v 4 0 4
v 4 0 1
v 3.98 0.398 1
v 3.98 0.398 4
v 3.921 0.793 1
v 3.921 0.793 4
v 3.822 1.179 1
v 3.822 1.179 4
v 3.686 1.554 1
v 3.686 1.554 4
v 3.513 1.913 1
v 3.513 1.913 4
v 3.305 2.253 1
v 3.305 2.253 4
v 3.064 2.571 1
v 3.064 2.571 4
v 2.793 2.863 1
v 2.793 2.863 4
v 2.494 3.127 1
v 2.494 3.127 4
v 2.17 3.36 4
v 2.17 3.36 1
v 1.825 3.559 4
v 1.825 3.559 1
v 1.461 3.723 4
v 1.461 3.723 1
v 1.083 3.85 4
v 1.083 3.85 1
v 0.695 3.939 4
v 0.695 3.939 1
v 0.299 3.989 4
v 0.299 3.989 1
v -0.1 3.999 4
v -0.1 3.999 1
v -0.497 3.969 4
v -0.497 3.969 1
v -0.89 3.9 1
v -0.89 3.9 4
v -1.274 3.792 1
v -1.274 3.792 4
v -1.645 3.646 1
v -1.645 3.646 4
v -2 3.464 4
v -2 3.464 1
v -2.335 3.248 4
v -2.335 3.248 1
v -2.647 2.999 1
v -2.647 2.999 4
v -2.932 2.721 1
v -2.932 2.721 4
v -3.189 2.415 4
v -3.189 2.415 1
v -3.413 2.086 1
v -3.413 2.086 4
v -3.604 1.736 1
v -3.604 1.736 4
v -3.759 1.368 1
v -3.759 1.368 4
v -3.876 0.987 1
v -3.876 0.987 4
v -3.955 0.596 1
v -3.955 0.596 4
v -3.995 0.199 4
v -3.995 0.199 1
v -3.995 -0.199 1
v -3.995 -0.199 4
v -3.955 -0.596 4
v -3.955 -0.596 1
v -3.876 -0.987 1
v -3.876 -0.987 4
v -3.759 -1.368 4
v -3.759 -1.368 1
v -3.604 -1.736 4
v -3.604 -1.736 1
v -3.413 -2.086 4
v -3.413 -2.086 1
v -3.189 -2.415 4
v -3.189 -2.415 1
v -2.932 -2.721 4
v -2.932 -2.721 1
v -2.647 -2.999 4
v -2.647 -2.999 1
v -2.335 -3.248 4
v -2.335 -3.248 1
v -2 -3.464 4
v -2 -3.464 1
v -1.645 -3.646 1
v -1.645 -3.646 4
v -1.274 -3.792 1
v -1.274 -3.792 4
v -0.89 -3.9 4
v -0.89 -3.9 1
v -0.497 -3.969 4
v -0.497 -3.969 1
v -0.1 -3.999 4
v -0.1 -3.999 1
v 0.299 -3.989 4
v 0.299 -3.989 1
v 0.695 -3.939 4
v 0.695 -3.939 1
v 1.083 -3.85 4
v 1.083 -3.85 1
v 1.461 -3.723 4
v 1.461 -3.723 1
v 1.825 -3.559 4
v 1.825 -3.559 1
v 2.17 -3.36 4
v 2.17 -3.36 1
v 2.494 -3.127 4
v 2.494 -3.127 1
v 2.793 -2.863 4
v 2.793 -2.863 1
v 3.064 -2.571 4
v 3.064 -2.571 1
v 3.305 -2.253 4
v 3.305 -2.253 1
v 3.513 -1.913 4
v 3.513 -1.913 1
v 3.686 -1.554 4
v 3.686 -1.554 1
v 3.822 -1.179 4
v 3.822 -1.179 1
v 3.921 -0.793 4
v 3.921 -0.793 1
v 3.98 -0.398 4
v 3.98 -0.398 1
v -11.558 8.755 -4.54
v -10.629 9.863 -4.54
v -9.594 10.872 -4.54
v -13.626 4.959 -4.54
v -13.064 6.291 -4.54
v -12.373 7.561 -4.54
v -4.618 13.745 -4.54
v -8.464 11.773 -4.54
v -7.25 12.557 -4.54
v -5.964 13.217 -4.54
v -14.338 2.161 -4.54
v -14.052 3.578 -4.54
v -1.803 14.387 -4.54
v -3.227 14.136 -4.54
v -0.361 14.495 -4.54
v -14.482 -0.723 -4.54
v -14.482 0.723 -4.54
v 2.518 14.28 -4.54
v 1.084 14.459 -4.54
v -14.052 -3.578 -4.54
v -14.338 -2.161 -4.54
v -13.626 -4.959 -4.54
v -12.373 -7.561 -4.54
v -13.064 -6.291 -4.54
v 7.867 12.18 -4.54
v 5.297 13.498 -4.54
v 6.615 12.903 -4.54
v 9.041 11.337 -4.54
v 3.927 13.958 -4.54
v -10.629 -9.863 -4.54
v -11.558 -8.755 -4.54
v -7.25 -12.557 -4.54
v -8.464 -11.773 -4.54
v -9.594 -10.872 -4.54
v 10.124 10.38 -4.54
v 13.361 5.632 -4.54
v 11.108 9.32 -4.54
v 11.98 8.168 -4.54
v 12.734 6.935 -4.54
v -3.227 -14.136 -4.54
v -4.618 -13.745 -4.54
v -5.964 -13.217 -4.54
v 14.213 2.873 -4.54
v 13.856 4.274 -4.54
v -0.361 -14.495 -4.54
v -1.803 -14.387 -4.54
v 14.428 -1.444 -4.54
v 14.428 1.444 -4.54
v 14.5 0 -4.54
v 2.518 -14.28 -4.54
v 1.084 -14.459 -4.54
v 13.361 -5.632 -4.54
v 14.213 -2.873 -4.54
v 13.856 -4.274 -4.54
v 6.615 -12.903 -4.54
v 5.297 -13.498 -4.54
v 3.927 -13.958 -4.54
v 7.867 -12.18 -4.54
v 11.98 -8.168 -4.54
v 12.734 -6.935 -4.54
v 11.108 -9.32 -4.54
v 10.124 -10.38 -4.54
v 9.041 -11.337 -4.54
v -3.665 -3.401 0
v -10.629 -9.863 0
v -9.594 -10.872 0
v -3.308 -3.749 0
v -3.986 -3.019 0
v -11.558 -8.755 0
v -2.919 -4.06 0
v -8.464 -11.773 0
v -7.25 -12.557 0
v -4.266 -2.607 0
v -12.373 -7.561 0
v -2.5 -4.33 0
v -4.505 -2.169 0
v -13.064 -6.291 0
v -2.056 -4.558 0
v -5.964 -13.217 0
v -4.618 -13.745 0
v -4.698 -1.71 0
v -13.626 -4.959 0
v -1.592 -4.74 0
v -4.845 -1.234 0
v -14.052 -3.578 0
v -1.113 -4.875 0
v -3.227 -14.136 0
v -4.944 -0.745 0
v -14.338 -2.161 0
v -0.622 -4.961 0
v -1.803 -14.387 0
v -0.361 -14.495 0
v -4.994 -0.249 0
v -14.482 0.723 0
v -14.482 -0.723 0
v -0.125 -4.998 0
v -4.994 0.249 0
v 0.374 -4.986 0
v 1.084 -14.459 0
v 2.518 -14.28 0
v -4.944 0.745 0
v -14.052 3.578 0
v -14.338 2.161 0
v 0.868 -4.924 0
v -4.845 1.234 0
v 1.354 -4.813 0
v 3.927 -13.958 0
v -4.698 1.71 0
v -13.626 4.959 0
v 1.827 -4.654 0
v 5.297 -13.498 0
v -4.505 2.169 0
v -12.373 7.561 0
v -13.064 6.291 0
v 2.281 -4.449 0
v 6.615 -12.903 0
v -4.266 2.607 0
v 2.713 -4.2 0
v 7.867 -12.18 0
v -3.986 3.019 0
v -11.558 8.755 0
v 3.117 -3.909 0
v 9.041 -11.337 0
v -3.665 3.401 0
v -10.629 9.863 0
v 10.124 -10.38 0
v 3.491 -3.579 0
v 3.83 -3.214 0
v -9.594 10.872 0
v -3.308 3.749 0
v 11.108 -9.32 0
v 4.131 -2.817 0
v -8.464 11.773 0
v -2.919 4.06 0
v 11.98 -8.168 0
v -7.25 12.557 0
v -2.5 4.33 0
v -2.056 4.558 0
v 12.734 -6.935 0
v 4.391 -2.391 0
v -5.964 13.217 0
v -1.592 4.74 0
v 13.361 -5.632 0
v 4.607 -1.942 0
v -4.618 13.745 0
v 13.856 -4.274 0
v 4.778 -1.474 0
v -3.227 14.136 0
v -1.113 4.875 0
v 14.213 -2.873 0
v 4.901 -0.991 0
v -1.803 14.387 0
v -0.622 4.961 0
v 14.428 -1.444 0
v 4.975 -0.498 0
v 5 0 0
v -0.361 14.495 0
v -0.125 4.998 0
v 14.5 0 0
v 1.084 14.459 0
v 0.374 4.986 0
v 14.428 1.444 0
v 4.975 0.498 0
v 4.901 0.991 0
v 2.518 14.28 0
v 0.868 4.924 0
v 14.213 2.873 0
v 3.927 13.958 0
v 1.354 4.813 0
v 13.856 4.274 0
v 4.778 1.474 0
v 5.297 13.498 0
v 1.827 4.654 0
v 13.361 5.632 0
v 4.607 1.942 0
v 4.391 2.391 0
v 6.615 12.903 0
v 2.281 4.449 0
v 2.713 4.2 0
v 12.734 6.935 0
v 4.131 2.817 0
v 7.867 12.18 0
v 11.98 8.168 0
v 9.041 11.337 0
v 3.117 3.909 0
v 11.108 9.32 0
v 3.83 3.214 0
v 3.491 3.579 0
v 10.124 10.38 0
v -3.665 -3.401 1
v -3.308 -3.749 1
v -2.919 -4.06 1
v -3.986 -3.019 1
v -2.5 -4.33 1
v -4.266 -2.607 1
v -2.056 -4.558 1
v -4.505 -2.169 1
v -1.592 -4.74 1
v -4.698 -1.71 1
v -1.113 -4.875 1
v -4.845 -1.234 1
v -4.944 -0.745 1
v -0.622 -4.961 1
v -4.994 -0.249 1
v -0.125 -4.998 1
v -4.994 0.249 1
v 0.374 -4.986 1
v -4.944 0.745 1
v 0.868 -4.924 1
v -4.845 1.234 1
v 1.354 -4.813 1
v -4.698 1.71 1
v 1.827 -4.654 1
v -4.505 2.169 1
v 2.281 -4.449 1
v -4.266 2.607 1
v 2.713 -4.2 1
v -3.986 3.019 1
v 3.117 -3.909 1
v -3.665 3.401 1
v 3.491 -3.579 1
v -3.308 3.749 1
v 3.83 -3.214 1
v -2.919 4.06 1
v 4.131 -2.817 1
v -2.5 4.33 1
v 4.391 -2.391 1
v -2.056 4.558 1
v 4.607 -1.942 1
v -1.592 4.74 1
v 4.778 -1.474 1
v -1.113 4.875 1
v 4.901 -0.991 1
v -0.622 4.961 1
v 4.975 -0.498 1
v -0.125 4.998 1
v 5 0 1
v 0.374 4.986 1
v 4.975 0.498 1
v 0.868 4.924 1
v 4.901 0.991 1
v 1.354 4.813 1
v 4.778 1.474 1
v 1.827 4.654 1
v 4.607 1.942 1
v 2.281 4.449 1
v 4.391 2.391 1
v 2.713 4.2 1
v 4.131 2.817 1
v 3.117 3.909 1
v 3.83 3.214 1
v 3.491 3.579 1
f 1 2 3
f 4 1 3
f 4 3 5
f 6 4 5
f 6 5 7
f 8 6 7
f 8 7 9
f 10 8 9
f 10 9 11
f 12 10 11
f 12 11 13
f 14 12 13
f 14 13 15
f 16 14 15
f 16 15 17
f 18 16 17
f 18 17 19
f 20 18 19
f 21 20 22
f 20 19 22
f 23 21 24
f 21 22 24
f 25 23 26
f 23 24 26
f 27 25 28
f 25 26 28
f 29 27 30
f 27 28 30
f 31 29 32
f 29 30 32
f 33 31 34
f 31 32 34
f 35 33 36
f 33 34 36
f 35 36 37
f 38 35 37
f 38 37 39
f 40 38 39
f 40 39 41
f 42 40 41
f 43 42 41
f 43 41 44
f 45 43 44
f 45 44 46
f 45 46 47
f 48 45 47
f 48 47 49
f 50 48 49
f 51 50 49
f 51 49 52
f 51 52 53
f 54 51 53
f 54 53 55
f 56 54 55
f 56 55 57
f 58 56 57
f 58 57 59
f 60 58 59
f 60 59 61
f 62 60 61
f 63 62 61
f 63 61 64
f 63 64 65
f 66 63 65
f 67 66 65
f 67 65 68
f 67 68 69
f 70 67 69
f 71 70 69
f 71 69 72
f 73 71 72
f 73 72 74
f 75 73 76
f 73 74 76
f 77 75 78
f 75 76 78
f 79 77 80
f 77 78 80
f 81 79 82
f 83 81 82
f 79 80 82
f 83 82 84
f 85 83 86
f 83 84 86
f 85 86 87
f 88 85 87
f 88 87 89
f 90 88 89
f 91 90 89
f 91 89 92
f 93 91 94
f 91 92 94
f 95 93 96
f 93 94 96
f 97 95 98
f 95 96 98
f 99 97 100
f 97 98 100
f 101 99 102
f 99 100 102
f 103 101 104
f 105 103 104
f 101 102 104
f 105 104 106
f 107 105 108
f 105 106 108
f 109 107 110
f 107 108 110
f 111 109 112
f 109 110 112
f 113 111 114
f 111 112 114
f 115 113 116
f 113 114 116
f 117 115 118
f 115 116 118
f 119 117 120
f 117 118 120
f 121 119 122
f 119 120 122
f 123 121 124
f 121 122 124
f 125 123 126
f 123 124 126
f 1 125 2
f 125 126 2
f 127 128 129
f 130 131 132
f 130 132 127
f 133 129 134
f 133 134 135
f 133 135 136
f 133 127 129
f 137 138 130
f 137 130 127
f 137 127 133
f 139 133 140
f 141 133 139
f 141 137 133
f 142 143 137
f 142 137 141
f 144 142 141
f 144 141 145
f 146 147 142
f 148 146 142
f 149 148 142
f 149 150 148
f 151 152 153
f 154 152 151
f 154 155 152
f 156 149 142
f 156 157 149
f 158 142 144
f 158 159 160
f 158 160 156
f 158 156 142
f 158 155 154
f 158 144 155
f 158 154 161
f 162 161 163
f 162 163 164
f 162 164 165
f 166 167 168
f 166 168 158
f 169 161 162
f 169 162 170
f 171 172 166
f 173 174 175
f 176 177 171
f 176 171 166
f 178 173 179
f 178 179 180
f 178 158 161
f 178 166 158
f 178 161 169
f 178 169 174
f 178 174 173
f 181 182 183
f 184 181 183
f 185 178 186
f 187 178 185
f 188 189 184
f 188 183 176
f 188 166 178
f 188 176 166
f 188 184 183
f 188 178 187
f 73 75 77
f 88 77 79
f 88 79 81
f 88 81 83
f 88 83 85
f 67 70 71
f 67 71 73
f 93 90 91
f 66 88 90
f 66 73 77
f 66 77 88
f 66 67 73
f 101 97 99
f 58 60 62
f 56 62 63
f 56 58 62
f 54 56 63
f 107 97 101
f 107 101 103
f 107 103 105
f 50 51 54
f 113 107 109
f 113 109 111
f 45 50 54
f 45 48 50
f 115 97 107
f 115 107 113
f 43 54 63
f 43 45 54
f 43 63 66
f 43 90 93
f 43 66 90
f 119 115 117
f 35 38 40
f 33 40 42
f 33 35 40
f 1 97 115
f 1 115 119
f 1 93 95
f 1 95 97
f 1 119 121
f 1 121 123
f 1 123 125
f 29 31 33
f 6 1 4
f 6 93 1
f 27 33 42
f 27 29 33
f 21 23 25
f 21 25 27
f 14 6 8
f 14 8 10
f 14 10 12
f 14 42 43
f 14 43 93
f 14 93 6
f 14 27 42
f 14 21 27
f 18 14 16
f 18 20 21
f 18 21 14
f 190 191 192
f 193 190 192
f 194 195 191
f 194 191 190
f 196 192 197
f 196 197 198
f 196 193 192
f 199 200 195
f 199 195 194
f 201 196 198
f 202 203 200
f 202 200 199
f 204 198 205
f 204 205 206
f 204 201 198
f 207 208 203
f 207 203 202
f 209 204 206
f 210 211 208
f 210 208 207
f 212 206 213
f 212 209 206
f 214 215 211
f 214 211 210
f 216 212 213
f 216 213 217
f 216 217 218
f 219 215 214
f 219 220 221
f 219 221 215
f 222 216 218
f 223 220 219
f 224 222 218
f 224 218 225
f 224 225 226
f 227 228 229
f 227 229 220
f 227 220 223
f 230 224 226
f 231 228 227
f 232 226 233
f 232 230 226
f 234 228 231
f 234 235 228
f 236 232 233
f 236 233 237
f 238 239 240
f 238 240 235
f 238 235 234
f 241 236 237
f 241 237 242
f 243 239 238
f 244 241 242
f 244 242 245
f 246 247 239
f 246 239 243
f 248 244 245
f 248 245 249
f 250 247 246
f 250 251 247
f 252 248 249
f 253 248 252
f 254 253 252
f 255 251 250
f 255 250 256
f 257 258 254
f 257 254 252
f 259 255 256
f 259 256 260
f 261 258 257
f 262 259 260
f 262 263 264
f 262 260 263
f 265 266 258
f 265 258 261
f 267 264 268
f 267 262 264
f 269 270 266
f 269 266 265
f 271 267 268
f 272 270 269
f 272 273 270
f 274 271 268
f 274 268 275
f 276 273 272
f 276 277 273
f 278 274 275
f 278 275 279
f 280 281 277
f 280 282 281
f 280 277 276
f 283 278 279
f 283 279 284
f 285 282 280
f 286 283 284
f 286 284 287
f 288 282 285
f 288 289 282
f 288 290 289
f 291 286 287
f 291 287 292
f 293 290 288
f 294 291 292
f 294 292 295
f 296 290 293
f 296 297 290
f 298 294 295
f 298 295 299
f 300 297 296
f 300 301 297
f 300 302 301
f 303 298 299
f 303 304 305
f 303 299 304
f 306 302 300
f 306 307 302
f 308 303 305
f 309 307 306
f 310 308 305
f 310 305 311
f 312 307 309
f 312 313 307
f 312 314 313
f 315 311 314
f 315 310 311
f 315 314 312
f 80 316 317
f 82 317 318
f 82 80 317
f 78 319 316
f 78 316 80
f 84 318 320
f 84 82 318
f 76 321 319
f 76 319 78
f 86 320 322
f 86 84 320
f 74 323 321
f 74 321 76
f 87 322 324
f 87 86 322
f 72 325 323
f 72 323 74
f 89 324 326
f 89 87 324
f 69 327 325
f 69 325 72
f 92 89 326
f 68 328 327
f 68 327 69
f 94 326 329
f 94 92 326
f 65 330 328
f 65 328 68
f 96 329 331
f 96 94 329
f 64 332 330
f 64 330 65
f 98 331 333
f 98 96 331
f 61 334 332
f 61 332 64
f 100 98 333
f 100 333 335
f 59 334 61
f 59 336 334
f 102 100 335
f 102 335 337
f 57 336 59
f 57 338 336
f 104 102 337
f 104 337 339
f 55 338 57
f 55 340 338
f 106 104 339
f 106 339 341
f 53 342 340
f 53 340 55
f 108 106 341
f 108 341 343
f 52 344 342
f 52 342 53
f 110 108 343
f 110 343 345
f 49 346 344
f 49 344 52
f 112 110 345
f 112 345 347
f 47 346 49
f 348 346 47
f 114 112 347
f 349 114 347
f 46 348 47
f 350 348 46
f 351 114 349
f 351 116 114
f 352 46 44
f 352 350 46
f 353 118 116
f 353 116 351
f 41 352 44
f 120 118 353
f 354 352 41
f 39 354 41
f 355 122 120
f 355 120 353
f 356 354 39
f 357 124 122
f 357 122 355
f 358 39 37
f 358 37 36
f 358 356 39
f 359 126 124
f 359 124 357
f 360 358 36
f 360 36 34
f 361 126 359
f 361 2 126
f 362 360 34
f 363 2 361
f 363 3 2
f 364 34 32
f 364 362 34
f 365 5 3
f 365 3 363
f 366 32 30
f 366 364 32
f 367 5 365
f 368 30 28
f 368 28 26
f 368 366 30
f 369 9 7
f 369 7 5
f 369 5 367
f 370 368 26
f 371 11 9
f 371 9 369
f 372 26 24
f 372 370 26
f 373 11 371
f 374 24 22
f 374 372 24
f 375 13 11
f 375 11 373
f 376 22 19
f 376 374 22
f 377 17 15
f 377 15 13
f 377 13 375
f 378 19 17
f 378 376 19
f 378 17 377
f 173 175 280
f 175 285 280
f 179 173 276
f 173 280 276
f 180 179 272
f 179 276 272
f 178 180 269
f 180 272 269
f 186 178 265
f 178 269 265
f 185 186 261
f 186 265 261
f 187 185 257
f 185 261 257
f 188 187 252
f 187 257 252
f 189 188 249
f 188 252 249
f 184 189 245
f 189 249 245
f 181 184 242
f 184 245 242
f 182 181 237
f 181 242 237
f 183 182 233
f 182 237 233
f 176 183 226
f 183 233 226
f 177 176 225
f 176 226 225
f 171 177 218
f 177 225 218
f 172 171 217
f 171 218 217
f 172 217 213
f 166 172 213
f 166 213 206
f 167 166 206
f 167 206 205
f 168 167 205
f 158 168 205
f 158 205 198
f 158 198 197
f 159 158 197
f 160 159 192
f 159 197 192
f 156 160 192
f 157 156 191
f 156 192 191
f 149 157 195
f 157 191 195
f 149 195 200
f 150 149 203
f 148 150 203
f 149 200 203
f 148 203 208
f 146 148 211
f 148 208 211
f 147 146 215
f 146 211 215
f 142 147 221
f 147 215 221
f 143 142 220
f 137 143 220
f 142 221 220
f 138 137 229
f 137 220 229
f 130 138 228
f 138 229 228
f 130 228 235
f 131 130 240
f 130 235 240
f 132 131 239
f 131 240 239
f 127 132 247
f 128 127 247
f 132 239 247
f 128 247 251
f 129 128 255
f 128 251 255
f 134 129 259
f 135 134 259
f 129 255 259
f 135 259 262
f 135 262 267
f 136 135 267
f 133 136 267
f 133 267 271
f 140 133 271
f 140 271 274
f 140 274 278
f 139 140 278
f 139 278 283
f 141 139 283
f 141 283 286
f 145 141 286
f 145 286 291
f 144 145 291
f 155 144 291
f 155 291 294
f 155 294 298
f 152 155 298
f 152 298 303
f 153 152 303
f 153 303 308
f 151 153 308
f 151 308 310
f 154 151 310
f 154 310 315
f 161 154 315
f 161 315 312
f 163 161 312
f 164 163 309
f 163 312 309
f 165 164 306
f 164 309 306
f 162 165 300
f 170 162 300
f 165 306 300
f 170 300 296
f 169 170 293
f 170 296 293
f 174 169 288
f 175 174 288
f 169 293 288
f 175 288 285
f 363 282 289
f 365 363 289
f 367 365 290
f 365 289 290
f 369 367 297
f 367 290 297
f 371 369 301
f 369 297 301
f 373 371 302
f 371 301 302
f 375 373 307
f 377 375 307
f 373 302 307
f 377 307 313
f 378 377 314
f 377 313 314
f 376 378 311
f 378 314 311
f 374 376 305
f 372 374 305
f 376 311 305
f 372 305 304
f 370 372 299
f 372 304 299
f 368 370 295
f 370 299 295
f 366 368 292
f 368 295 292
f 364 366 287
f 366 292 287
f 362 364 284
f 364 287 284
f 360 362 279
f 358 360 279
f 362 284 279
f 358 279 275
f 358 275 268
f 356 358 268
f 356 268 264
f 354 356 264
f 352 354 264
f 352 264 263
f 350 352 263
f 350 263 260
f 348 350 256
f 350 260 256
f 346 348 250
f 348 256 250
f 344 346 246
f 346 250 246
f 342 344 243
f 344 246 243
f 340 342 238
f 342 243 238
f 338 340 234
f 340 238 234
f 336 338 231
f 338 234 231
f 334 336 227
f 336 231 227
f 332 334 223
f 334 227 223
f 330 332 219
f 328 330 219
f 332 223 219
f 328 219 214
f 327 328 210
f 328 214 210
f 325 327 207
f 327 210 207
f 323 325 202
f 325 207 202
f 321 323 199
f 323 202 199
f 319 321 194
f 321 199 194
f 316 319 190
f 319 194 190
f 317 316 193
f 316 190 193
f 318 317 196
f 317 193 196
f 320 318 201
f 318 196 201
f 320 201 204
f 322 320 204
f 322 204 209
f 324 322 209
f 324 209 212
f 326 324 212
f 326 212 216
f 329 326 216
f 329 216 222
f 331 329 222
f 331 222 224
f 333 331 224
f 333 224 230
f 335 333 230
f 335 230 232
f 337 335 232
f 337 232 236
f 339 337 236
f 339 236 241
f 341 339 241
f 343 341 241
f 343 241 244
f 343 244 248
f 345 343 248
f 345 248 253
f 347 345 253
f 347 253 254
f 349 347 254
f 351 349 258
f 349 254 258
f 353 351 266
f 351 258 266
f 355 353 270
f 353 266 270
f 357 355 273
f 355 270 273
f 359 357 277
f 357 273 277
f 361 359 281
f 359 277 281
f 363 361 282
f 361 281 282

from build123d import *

# Parameters (mm, degrees)
F0_R      = 4
F1_DEPTH  = 4
F2_R      = 14.5
F3_DEPTH  = 2
F4_R      = 5
F5_DEPTH  = 1
F3_FACE_R = 14.5
F6_DEPTH  = 2.54


with BuildPart() as f1:
    # F0 (on Top) → F1 (new body)
    with BuildSketch(Plane.XY):
        Circle(F0_R)
    extrude(amount=F1_DEPTH)

    # F2 (on Top) → F3 (join)
    with BuildSketch(Plane.XY):
        Circle(F2_R)
    extrude(amount=-F3_DEPTH)

    # F4 (on Top) → F5 (join)
    with BuildSketch(Plane.XY):
        Circle(F4_R)
    extrude(amount=F5_DEPTH)

    # F3_face (on face) → F6 (join)
    with BuildSketch(Plane(origin=(0, 0, -2), x_dir=(1, 0, 0), z_dir=(0, 0, -1))):
        Circle(F3_FACE_R)
    extrude(amount=F6_DEPTH)


solid = f1.part
